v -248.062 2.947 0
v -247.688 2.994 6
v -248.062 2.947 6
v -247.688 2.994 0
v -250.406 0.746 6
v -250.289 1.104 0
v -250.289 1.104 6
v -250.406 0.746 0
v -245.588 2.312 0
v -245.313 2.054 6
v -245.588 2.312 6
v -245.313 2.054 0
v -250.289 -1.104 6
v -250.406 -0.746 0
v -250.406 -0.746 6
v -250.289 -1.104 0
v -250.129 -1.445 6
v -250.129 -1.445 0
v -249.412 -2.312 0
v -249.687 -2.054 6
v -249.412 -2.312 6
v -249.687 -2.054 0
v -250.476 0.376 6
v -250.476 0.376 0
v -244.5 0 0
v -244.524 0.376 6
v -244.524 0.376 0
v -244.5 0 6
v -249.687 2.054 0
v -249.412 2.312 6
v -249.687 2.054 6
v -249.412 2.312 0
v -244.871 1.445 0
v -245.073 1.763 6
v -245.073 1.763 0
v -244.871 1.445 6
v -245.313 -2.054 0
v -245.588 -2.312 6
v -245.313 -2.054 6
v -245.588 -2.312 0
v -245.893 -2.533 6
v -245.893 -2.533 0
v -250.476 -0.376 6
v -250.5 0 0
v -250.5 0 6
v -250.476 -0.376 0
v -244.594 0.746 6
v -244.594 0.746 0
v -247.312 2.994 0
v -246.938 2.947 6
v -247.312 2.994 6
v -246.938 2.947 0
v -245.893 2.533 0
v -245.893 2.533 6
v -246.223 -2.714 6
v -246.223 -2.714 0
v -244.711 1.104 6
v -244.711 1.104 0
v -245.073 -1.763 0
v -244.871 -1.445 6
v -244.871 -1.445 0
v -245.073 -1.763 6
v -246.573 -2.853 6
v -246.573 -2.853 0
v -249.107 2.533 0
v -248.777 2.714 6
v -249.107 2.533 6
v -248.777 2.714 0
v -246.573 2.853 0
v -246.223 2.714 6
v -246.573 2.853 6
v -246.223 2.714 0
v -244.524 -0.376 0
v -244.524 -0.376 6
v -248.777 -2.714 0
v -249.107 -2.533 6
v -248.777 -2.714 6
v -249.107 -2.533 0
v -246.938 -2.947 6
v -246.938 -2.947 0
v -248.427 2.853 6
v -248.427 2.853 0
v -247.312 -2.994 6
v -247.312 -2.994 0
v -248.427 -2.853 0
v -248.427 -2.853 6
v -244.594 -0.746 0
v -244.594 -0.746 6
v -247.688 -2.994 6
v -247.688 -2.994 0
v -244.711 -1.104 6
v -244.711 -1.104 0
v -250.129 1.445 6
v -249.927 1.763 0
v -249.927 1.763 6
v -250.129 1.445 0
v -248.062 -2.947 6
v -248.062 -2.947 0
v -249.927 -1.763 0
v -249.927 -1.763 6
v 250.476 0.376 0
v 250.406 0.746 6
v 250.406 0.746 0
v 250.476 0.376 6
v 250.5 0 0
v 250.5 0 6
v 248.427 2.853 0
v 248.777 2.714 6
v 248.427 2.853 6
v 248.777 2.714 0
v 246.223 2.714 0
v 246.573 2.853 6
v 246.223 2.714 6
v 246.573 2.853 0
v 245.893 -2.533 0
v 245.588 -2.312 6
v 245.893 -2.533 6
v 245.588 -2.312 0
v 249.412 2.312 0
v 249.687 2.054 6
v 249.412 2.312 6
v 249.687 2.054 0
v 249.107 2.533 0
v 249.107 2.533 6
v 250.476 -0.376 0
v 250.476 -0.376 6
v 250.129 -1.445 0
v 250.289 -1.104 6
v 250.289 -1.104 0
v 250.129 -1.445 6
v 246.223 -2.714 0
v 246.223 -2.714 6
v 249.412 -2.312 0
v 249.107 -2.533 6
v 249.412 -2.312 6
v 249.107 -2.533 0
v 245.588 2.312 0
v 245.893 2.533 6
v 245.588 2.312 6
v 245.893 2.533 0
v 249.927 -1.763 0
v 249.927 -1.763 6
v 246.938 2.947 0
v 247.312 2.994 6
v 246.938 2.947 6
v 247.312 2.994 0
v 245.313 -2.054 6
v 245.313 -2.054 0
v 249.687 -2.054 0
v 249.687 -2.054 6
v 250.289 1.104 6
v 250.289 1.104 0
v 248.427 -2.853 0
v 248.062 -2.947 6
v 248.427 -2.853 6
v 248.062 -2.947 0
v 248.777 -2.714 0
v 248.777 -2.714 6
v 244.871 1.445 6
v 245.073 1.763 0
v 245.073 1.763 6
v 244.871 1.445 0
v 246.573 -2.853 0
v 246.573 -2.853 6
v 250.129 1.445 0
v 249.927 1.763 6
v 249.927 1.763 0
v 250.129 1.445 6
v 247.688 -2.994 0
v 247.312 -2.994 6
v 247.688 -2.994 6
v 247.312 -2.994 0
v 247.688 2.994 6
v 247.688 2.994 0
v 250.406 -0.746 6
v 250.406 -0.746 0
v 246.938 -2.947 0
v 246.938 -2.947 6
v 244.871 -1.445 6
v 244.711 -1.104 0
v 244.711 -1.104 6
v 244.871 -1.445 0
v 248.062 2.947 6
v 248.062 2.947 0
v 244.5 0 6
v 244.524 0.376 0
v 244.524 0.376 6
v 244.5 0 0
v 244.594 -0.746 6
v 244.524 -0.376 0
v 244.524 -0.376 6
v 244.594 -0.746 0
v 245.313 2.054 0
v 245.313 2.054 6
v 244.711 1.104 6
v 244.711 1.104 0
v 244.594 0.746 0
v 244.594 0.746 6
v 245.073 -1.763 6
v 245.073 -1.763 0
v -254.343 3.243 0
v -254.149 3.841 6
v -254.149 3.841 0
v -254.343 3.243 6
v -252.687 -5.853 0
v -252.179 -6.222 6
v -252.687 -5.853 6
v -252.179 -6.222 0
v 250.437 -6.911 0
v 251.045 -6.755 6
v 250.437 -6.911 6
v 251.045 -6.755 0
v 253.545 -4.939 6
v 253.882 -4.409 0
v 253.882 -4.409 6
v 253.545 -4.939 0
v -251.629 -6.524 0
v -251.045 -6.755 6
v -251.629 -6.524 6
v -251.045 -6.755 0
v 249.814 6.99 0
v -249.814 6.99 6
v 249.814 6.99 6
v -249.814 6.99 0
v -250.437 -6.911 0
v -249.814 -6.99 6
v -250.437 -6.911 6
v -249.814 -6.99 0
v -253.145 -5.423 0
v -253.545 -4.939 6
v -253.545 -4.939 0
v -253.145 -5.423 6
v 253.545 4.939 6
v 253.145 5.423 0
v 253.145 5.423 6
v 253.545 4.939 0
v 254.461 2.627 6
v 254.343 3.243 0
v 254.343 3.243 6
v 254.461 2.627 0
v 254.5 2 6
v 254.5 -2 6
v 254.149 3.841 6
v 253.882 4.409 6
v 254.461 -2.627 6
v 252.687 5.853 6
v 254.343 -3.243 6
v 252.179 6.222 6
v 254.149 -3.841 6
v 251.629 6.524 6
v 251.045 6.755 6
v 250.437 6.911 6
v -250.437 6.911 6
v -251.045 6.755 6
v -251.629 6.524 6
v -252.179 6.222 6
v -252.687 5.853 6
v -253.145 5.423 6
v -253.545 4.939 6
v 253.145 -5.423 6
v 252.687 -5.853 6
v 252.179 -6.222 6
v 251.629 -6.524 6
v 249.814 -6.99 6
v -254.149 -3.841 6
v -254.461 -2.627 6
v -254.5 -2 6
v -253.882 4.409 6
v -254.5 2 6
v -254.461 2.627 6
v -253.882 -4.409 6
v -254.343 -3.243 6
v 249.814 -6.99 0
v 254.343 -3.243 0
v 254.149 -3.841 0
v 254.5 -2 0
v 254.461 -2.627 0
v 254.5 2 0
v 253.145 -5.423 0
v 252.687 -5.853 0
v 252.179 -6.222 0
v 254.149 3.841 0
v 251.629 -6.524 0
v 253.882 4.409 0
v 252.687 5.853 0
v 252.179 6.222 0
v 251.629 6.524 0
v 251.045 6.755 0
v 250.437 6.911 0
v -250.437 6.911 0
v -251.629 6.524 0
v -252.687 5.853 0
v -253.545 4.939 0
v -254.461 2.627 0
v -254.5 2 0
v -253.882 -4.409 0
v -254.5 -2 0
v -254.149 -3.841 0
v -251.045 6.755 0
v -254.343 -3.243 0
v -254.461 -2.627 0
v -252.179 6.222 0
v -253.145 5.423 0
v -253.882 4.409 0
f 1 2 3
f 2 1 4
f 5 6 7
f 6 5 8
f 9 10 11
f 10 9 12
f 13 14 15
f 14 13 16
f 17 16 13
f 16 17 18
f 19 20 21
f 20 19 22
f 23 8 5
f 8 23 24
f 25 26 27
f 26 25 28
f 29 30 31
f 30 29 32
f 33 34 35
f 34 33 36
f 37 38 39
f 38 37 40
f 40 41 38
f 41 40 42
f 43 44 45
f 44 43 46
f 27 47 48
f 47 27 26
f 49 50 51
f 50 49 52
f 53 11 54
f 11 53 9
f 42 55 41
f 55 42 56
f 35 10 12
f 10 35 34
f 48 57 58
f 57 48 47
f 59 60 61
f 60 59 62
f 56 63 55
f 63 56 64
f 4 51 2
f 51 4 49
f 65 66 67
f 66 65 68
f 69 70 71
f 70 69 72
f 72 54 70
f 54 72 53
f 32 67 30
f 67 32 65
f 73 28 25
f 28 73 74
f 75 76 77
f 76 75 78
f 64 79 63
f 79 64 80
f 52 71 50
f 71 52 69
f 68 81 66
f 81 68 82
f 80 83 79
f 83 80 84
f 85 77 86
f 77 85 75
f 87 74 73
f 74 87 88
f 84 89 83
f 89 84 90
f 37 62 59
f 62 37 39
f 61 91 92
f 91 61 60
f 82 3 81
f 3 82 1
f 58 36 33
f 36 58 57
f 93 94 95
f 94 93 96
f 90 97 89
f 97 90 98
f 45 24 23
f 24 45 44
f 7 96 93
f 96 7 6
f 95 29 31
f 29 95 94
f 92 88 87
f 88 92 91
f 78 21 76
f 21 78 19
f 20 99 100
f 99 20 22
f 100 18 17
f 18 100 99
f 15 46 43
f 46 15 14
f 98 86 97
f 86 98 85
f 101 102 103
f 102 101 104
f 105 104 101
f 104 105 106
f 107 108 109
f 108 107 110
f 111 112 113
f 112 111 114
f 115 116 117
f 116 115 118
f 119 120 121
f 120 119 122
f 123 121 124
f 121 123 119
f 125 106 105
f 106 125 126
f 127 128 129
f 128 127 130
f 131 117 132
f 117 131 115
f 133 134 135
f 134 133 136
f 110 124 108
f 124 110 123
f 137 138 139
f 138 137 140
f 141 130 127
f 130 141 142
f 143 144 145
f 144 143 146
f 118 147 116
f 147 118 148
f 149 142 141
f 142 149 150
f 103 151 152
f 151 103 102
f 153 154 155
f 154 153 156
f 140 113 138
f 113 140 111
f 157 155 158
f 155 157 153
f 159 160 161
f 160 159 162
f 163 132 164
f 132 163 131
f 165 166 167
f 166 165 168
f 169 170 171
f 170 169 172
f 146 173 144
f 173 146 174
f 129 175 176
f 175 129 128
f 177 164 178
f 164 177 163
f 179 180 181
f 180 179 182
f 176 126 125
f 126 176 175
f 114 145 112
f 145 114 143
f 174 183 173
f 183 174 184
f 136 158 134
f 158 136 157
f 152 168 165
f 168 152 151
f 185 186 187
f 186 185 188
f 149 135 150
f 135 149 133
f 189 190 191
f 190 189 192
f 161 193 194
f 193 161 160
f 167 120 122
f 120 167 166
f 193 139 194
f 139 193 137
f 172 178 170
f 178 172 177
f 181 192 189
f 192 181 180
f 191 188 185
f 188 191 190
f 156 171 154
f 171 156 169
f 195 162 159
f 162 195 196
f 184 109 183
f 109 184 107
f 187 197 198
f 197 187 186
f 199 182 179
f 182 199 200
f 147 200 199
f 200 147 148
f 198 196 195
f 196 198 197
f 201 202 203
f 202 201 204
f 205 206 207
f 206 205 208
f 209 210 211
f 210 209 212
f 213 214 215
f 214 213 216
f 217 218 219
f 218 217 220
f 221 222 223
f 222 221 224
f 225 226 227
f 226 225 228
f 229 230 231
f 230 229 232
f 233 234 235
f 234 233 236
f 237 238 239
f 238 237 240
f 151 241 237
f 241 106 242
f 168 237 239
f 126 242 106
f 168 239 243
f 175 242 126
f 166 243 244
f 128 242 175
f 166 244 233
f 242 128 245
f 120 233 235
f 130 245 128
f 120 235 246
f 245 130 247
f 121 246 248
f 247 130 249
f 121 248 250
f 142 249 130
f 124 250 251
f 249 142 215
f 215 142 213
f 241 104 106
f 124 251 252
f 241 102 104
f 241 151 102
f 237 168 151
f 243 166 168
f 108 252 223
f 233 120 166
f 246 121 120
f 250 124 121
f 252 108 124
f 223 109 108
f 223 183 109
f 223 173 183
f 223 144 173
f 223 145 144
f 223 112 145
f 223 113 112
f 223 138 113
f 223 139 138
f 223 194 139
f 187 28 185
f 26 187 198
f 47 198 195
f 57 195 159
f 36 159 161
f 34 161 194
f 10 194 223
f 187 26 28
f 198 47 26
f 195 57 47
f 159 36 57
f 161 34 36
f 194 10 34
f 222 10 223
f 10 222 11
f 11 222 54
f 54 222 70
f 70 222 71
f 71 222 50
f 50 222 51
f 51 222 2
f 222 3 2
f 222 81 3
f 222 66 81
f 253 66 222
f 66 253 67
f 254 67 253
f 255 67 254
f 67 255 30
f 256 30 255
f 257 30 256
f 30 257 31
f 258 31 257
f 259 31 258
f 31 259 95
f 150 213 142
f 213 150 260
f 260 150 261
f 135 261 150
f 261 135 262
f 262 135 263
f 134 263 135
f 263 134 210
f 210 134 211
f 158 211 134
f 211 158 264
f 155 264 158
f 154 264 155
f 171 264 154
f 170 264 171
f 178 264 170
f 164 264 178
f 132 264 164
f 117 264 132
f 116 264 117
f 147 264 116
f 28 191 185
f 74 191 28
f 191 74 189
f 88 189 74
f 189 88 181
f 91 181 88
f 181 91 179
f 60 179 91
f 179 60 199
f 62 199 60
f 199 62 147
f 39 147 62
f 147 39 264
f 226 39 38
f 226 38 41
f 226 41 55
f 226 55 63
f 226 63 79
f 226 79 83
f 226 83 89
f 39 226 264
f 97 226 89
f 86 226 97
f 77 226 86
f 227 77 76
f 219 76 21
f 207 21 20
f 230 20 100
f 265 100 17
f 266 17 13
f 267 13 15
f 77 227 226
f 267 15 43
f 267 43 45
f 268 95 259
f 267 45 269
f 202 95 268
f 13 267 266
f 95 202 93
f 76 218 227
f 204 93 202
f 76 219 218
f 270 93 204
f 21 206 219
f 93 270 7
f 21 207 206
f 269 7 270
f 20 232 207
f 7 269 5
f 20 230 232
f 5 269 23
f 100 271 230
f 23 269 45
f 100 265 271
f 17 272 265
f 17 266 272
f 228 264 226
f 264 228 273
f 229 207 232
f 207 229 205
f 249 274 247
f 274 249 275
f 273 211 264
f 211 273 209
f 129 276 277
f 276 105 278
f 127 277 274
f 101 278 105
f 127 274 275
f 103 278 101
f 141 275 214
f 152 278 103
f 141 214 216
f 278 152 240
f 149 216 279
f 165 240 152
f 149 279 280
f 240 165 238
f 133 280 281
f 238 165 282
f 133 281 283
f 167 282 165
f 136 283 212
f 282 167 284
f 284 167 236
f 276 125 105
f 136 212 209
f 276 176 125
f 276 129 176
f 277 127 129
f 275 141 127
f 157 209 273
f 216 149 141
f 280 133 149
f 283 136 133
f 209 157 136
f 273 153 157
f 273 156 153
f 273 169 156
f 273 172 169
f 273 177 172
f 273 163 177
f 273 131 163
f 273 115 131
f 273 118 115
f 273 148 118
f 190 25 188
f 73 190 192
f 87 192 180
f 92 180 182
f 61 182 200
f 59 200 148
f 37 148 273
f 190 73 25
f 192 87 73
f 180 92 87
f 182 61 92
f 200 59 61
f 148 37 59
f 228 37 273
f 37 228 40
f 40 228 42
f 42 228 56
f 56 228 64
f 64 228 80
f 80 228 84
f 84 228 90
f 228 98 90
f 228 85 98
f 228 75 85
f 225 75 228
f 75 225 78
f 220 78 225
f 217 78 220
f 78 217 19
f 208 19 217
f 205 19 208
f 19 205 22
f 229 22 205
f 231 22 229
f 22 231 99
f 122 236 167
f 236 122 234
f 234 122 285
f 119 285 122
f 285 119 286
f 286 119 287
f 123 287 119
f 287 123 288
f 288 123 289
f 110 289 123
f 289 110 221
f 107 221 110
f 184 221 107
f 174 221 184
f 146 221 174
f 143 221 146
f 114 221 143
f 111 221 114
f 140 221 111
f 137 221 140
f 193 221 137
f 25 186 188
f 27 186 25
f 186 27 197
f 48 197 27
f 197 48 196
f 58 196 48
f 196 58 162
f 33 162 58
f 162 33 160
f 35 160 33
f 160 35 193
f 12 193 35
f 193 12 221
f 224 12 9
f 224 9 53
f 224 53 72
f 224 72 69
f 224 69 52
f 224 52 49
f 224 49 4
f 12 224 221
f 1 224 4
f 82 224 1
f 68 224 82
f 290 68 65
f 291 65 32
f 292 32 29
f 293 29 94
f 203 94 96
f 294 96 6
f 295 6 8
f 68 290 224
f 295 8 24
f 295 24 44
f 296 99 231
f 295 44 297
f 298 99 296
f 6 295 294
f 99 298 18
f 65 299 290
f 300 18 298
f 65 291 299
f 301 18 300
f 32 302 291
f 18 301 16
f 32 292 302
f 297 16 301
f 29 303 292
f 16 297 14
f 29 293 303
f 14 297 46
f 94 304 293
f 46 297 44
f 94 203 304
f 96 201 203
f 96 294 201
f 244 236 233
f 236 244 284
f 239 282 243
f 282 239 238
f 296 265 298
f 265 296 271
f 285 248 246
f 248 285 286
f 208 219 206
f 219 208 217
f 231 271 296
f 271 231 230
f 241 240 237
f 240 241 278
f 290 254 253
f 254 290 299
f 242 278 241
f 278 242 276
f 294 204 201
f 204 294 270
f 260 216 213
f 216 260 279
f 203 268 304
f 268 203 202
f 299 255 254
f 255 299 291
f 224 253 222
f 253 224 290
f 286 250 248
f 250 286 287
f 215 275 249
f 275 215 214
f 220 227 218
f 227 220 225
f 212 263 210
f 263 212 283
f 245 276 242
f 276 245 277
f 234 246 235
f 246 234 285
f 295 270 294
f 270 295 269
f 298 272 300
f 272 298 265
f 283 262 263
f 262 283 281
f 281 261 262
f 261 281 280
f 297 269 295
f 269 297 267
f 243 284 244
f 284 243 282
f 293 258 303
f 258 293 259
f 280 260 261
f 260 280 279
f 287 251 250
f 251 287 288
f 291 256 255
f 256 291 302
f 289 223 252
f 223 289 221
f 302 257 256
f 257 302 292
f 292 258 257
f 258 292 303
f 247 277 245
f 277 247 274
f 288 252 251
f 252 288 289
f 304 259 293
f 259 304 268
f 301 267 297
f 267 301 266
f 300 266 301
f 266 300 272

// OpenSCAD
$fn = 50;


difference() {
	union() {
		hull() {
			translate(v = [-249.5000000000, 2.0000000000, 0]) {
				cylinder(h = 6, r = 5);
			}
			translate(v = [249.5000000000, 2.0000000000, 0]) {
				cylinder(h = 6, r = 5);
			}
			translate(v = [-249.5000000000, -2.0000000000, 0]) {
				cylinder(h = 6, r = 5);
			}
			translate(v = [249.5000000000, -2.0000000000, 0]) {
				cylinder(h = 6, r = 5);
			}
		}
	}
	union() {
		translate(v = [-247.5000000000, 0.0000000000, -100.0000000000]) {
			cylinder(h = 200, r = 3.0000000000);
		}
		translate(v = [-247.5000000000, 0.0000000000, -100.0000000000]) {
			cylinder(h = 200, r = 3.0000000000);
		}
		translate(v = [247.5000000000, 0.0000000000, -100.0000000000]) {
			cylinder(h = 200, r = 3.0000000000);
		}
		translate(v = [247.5000000000, 0.0000000000, -100.0000000000]) {
			cylinder(h = 200, r = 3.0000000000);
		}
	}
}
